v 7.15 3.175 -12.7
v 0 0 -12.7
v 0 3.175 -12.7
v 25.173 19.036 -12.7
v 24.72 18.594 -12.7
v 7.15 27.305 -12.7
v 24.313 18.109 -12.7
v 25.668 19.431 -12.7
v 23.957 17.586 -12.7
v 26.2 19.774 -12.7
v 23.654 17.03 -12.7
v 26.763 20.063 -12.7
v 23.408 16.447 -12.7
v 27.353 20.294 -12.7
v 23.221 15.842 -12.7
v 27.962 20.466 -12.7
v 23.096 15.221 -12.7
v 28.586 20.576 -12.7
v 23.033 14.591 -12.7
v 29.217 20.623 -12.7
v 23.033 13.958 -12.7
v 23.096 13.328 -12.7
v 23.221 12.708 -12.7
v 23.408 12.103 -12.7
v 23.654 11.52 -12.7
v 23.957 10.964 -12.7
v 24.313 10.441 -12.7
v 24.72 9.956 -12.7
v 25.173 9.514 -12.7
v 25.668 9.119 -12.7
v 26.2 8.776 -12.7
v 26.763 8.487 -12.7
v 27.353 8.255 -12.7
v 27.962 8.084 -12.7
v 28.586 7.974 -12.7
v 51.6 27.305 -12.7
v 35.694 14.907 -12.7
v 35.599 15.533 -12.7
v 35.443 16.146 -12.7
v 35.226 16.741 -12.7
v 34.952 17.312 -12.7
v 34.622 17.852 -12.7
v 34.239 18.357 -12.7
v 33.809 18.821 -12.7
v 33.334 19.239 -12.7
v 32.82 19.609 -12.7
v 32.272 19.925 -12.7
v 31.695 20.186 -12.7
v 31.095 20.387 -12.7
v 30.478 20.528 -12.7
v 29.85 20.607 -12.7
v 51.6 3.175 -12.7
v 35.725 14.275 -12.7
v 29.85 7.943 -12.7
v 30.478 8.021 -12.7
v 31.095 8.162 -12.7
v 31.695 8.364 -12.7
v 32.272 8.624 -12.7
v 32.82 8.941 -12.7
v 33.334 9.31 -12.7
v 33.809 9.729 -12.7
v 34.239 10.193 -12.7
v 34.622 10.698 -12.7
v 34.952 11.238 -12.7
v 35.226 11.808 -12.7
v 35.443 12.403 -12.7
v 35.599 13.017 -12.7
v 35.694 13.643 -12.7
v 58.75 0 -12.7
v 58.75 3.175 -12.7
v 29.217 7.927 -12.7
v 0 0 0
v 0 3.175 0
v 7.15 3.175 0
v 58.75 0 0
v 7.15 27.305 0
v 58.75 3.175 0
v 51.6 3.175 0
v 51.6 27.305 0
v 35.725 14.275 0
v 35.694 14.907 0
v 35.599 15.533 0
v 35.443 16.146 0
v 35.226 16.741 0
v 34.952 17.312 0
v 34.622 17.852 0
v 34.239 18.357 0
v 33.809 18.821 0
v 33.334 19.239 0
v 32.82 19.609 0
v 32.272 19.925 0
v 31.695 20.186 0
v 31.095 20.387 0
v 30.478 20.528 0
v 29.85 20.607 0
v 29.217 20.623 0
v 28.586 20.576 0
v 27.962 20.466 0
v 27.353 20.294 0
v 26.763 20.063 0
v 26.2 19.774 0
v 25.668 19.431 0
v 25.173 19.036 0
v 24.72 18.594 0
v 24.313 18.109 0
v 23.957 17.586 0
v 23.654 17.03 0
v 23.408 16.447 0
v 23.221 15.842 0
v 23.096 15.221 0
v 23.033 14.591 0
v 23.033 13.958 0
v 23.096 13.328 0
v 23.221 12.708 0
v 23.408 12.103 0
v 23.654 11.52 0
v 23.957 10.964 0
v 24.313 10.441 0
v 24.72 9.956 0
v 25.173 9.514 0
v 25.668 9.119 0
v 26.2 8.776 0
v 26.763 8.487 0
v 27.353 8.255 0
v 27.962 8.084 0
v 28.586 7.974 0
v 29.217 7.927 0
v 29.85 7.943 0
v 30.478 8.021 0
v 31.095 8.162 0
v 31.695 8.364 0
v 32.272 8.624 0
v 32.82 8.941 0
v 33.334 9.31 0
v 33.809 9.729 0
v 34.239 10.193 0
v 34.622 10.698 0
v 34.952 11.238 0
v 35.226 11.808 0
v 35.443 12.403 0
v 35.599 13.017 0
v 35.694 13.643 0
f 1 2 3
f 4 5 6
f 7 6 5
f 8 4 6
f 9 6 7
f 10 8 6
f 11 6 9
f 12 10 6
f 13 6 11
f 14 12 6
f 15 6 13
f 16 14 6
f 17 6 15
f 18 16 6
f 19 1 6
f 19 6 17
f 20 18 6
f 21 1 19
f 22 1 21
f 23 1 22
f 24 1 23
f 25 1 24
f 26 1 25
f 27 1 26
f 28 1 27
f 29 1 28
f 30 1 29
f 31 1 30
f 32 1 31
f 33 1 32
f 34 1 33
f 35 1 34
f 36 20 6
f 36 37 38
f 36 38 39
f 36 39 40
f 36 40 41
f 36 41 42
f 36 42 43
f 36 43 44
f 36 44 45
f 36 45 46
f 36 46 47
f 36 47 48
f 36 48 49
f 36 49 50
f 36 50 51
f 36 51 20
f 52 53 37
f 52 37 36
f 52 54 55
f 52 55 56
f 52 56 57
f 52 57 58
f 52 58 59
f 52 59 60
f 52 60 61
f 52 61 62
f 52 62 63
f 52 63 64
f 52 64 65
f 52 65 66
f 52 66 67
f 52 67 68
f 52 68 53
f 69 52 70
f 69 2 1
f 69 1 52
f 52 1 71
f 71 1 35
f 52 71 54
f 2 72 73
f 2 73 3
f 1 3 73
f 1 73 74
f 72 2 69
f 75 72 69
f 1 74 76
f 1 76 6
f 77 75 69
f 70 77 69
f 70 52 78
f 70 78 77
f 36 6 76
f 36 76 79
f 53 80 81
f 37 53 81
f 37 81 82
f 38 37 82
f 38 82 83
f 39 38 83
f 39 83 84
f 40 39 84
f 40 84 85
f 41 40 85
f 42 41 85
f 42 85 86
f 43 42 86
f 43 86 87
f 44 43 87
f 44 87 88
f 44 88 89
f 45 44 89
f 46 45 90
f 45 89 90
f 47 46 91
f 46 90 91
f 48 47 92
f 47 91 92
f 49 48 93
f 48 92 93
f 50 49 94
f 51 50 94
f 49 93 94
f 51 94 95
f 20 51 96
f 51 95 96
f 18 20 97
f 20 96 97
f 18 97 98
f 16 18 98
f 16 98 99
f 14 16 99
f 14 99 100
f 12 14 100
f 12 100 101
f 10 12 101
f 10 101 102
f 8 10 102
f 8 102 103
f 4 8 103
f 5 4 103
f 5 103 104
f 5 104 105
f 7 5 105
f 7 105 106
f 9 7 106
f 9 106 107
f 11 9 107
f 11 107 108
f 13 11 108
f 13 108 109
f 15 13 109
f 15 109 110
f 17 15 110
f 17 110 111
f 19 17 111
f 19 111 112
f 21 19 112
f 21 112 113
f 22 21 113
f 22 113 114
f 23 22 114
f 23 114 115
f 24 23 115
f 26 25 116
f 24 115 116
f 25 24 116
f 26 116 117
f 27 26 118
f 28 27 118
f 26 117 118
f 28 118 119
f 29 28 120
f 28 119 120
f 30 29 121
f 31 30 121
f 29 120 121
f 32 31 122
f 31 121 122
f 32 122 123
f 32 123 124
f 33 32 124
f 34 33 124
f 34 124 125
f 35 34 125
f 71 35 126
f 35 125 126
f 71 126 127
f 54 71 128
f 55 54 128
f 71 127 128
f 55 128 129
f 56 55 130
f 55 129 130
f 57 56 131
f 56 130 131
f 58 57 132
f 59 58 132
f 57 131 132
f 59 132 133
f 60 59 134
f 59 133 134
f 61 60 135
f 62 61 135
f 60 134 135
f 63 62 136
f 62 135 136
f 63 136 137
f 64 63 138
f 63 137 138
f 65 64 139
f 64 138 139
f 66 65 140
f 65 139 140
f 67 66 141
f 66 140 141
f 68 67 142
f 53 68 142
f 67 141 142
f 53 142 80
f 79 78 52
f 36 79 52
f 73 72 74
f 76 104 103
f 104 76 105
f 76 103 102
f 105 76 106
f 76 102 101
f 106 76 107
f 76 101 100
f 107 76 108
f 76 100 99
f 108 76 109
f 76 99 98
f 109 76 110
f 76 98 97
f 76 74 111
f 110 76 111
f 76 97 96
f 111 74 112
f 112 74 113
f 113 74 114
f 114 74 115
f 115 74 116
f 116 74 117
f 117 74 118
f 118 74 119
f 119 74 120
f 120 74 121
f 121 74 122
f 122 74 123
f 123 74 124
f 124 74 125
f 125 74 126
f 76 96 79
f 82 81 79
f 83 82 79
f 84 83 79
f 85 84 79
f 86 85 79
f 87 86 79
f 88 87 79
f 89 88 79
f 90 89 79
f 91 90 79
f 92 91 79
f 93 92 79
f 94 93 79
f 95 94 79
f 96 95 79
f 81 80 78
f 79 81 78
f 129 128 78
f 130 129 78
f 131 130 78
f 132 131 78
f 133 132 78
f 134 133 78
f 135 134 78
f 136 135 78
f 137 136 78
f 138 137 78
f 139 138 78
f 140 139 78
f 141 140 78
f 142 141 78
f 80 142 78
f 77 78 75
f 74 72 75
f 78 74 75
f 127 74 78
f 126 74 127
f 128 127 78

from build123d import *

# Parameters (mm, degrees)
SKETCH1_W           = 58.7502
SKETCH1_H           = 12.7
BOSS_EXTRUDE1_DEPTH = 3.175
SKETCH2_W           = 44.45
SKETCH2_H           = 12.7
BOSS_EXTRUDE2_DEPTH = 24.13
SKETCH3_R           = 6.35
CUT_EXTRUDE1_DEPTH  = 24.13


with BuildPart() as part:
    # Sketch1 → Boss-Extrude1 (new body)
    with BuildSketch(Plane(origin=(0, 0, 0), x_dir=(1, 0, 0), z_dir=(0, 1, 0))):
        with Locations((29.3751, 6.35)):
            Rectangle(SKETCH1_W, SKETCH1_H)
    extrude(amount=BOSS_EXTRUDE1_DEPTH)

    # Sketch2 → Boss-Extrude2 (add)
    with BuildSketch(Plane(origin=(0, 3.175, 0), x_dir=(1, 0, 0), z_dir=(0, 1, 0))):
        with Locations((29.3751, 6.35)):
            Rectangle(SKETCH2_W, SKETCH2_H)
    extrude(amount=BOSS_EXTRUDE2_DEPTH)

    # Sketch3 → Cut-Extrude1 (cut)
    with BuildSketch(Plane.XY):
        with Locations((29.3751, 14.2748)):
            Circle(SKETCH3_R)
    extrude(amount=-CUT_EXTRUDE1_DEPTH, mode=Mode.SUBTRACT)


solid = part.part
